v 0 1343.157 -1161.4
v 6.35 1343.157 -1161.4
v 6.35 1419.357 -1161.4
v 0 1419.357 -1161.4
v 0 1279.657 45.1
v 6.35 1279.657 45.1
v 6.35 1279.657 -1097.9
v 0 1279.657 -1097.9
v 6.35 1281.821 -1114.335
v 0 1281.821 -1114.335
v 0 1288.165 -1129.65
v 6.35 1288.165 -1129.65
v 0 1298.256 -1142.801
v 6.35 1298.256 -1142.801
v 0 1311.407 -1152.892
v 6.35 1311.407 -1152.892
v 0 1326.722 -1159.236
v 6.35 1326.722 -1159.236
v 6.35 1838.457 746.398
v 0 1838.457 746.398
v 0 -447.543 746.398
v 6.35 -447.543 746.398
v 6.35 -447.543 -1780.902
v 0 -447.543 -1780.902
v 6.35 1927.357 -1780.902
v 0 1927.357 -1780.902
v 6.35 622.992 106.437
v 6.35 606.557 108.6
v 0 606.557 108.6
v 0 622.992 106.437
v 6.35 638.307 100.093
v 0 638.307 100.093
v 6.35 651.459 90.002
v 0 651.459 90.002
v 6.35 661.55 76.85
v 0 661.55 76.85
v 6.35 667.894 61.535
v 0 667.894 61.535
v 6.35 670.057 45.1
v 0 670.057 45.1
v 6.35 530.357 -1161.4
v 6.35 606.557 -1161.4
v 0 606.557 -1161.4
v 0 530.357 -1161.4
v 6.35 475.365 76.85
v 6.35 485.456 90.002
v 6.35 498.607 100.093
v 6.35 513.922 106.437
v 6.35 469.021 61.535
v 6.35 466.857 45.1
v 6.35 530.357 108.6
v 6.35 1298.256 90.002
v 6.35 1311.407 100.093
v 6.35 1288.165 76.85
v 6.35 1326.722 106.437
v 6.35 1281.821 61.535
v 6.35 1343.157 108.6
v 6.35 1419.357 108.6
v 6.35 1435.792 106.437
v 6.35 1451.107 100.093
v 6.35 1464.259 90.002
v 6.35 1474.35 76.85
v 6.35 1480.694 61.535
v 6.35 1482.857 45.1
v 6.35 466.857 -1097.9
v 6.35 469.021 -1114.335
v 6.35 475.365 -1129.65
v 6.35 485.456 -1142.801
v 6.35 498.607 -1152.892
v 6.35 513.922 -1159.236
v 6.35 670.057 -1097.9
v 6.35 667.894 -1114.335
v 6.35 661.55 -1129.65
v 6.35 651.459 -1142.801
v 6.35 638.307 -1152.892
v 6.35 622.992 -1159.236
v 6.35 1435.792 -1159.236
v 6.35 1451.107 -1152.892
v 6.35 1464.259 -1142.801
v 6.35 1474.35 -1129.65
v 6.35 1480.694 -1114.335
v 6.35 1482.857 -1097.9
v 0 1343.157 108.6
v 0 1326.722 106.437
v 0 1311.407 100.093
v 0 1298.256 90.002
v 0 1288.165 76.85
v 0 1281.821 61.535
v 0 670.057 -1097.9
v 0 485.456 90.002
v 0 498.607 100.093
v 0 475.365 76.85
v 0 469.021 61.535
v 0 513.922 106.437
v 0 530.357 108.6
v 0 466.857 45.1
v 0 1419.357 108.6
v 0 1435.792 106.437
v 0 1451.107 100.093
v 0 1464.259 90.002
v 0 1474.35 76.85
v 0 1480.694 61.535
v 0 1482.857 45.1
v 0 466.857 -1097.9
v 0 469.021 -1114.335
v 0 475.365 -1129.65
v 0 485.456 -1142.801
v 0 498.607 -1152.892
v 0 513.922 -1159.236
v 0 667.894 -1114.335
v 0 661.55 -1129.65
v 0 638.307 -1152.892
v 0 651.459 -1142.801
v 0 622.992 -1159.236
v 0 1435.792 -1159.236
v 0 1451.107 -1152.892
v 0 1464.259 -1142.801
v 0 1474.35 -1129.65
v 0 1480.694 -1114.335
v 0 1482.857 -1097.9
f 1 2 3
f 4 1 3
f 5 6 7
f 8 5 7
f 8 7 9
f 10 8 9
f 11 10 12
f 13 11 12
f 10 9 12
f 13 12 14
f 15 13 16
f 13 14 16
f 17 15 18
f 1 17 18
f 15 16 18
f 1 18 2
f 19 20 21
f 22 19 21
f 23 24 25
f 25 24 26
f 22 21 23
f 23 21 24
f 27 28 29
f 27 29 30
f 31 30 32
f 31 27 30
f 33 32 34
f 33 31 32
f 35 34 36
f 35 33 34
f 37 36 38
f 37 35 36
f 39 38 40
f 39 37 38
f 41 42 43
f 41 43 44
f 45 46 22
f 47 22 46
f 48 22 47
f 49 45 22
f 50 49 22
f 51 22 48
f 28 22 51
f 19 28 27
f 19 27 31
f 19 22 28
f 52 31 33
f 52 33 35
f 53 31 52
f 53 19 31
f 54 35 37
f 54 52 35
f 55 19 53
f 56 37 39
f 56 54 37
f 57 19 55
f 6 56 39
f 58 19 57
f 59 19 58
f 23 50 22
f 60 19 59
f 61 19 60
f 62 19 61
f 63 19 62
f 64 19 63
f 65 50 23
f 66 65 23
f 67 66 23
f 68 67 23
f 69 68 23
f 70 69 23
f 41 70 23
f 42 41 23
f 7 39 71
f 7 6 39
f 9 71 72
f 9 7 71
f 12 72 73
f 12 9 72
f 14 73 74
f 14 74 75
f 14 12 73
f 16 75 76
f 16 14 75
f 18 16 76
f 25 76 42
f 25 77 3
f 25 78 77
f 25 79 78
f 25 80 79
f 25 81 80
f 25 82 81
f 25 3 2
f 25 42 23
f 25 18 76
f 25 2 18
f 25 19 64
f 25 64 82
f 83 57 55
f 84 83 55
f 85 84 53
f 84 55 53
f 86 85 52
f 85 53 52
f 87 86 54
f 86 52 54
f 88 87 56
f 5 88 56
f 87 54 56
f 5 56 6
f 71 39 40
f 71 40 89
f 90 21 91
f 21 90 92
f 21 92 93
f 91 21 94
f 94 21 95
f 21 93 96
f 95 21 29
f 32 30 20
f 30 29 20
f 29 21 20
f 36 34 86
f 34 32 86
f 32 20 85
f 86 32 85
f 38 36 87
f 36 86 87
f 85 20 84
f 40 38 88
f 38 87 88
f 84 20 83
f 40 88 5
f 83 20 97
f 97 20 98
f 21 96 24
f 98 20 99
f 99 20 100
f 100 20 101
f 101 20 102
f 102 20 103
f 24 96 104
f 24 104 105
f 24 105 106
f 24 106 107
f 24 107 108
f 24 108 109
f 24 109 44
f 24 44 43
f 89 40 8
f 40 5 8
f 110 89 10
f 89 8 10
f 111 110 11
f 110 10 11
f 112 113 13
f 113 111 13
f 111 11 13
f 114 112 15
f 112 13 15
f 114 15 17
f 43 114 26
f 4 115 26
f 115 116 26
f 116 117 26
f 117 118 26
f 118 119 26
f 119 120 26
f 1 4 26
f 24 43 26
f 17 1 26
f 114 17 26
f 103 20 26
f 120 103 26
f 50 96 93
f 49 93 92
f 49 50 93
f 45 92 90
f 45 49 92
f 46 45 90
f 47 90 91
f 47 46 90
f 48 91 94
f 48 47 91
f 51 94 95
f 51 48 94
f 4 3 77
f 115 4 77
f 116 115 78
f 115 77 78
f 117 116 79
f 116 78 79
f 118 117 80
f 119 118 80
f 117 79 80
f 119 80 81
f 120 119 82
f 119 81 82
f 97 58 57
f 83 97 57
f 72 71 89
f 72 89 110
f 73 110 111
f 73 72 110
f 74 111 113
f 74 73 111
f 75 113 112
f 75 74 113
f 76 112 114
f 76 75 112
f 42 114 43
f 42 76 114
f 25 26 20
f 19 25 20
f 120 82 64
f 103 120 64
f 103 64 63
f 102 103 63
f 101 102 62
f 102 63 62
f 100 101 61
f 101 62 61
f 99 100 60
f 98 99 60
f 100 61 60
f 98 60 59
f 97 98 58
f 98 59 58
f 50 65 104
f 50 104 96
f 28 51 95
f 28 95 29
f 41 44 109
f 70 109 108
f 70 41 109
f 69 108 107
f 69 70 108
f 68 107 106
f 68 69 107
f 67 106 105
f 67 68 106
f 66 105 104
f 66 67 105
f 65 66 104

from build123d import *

# Parameters (mm, degrees)
BOSS_EXTRUDE1_DEPTH = 6.35
CUT_EXTRUDE1_DEPTH  = 50.8


with BuildPart() as part:
    # Sketch1 → Boss-Extrude1 (new body)
    with BuildSketch(Plane(origin=(0, 0, 0), x_dir=(0, 0, -1), z_dir=(1, 0, 0))):
        Polygon((-746.398166827, -447.542708333), (1780.901833173, -447.542708333), (1780.901833173, 1927.357291667), (-746.398166827, 1838.457291667), align=None)
    extrude(amount=BOSS_EXTRUDE1_DEPTH)

    # Sketch2 → Cut-Extrude1 (cut)
    with BuildSketch(Plane(origin=(6.35, 0, 0), x_dir=(0, 0, -1), z_dir=(1, 0, 0))):
        with BuildLine():
            Line((-45.100318004, 670.057291667), (1097.899681996, 670.057291667))
            ThreePointArc((1097.899681996, 670.057291667), (1142.800962601, 651.458572272), (1161.399681996, 606.557291667))
            Line((1161.399681996, 606.557291667), (1161.399681996, 530.357291667))
            ThreePointArc((1161.399681996, 530.357291667), (1142.800962601, 485.456011061), (1097.899681996, 466.857291667))
            Line((1097.899681996, 466.857291667), (-45.100318004, 466.857291667))
            ThreePointArc((-45.100318004, 466.857291667), (-90.001598609, 485.456011061), (-108.600318004, 530.357291667))
            Line((-108.600318004, 530.357291667), (-108.600318004, 606.557291667))
            ThreePointArc((-108.600318004, 606.557291667), (-90.001598609, 651.458572272), (-45.100318004, 670.057291667))
        make_face()
        with BuildLine():
            Line((1097.899681996, 1482.857291667), (-45.100318004, 1482.857291667))
            ThreePointArc((-45.100318004, 1482.857291667), (-90.001598609, 1464.258572272), (-108.600318004, 1419.357291667))
            Line((-108.600318004, 1419.357291667), (-108.600318004, 1343.157291667))
            ThreePointArc((-108.600318004, 1343.157291667), (-90.001598609, 1298.256011061), (-45.100318004, 1279.657291667))
            Line((-45.100318004, 1279.657291667), (1097.899681996, 1279.657291667))
            ThreePointArc((1097.899681996, 1279.657291667), (1142.800962601, 1298.256011061), (1161.399681996, 1343.157291667))
            Line((1161.399681996, 1343.157291667), (1161.399681996, 1419.357291667))
            ThreePointArc((1161.399681996, 1419.357291667), (1142.800962601, 1464.258572272), (1097.899681996, 1482.857291667))
        make_face()
    extrude(amount=-CUT_EXTRUDE1_DEPTH, mode=Mode.SUBTRACT)


solid = part.part
